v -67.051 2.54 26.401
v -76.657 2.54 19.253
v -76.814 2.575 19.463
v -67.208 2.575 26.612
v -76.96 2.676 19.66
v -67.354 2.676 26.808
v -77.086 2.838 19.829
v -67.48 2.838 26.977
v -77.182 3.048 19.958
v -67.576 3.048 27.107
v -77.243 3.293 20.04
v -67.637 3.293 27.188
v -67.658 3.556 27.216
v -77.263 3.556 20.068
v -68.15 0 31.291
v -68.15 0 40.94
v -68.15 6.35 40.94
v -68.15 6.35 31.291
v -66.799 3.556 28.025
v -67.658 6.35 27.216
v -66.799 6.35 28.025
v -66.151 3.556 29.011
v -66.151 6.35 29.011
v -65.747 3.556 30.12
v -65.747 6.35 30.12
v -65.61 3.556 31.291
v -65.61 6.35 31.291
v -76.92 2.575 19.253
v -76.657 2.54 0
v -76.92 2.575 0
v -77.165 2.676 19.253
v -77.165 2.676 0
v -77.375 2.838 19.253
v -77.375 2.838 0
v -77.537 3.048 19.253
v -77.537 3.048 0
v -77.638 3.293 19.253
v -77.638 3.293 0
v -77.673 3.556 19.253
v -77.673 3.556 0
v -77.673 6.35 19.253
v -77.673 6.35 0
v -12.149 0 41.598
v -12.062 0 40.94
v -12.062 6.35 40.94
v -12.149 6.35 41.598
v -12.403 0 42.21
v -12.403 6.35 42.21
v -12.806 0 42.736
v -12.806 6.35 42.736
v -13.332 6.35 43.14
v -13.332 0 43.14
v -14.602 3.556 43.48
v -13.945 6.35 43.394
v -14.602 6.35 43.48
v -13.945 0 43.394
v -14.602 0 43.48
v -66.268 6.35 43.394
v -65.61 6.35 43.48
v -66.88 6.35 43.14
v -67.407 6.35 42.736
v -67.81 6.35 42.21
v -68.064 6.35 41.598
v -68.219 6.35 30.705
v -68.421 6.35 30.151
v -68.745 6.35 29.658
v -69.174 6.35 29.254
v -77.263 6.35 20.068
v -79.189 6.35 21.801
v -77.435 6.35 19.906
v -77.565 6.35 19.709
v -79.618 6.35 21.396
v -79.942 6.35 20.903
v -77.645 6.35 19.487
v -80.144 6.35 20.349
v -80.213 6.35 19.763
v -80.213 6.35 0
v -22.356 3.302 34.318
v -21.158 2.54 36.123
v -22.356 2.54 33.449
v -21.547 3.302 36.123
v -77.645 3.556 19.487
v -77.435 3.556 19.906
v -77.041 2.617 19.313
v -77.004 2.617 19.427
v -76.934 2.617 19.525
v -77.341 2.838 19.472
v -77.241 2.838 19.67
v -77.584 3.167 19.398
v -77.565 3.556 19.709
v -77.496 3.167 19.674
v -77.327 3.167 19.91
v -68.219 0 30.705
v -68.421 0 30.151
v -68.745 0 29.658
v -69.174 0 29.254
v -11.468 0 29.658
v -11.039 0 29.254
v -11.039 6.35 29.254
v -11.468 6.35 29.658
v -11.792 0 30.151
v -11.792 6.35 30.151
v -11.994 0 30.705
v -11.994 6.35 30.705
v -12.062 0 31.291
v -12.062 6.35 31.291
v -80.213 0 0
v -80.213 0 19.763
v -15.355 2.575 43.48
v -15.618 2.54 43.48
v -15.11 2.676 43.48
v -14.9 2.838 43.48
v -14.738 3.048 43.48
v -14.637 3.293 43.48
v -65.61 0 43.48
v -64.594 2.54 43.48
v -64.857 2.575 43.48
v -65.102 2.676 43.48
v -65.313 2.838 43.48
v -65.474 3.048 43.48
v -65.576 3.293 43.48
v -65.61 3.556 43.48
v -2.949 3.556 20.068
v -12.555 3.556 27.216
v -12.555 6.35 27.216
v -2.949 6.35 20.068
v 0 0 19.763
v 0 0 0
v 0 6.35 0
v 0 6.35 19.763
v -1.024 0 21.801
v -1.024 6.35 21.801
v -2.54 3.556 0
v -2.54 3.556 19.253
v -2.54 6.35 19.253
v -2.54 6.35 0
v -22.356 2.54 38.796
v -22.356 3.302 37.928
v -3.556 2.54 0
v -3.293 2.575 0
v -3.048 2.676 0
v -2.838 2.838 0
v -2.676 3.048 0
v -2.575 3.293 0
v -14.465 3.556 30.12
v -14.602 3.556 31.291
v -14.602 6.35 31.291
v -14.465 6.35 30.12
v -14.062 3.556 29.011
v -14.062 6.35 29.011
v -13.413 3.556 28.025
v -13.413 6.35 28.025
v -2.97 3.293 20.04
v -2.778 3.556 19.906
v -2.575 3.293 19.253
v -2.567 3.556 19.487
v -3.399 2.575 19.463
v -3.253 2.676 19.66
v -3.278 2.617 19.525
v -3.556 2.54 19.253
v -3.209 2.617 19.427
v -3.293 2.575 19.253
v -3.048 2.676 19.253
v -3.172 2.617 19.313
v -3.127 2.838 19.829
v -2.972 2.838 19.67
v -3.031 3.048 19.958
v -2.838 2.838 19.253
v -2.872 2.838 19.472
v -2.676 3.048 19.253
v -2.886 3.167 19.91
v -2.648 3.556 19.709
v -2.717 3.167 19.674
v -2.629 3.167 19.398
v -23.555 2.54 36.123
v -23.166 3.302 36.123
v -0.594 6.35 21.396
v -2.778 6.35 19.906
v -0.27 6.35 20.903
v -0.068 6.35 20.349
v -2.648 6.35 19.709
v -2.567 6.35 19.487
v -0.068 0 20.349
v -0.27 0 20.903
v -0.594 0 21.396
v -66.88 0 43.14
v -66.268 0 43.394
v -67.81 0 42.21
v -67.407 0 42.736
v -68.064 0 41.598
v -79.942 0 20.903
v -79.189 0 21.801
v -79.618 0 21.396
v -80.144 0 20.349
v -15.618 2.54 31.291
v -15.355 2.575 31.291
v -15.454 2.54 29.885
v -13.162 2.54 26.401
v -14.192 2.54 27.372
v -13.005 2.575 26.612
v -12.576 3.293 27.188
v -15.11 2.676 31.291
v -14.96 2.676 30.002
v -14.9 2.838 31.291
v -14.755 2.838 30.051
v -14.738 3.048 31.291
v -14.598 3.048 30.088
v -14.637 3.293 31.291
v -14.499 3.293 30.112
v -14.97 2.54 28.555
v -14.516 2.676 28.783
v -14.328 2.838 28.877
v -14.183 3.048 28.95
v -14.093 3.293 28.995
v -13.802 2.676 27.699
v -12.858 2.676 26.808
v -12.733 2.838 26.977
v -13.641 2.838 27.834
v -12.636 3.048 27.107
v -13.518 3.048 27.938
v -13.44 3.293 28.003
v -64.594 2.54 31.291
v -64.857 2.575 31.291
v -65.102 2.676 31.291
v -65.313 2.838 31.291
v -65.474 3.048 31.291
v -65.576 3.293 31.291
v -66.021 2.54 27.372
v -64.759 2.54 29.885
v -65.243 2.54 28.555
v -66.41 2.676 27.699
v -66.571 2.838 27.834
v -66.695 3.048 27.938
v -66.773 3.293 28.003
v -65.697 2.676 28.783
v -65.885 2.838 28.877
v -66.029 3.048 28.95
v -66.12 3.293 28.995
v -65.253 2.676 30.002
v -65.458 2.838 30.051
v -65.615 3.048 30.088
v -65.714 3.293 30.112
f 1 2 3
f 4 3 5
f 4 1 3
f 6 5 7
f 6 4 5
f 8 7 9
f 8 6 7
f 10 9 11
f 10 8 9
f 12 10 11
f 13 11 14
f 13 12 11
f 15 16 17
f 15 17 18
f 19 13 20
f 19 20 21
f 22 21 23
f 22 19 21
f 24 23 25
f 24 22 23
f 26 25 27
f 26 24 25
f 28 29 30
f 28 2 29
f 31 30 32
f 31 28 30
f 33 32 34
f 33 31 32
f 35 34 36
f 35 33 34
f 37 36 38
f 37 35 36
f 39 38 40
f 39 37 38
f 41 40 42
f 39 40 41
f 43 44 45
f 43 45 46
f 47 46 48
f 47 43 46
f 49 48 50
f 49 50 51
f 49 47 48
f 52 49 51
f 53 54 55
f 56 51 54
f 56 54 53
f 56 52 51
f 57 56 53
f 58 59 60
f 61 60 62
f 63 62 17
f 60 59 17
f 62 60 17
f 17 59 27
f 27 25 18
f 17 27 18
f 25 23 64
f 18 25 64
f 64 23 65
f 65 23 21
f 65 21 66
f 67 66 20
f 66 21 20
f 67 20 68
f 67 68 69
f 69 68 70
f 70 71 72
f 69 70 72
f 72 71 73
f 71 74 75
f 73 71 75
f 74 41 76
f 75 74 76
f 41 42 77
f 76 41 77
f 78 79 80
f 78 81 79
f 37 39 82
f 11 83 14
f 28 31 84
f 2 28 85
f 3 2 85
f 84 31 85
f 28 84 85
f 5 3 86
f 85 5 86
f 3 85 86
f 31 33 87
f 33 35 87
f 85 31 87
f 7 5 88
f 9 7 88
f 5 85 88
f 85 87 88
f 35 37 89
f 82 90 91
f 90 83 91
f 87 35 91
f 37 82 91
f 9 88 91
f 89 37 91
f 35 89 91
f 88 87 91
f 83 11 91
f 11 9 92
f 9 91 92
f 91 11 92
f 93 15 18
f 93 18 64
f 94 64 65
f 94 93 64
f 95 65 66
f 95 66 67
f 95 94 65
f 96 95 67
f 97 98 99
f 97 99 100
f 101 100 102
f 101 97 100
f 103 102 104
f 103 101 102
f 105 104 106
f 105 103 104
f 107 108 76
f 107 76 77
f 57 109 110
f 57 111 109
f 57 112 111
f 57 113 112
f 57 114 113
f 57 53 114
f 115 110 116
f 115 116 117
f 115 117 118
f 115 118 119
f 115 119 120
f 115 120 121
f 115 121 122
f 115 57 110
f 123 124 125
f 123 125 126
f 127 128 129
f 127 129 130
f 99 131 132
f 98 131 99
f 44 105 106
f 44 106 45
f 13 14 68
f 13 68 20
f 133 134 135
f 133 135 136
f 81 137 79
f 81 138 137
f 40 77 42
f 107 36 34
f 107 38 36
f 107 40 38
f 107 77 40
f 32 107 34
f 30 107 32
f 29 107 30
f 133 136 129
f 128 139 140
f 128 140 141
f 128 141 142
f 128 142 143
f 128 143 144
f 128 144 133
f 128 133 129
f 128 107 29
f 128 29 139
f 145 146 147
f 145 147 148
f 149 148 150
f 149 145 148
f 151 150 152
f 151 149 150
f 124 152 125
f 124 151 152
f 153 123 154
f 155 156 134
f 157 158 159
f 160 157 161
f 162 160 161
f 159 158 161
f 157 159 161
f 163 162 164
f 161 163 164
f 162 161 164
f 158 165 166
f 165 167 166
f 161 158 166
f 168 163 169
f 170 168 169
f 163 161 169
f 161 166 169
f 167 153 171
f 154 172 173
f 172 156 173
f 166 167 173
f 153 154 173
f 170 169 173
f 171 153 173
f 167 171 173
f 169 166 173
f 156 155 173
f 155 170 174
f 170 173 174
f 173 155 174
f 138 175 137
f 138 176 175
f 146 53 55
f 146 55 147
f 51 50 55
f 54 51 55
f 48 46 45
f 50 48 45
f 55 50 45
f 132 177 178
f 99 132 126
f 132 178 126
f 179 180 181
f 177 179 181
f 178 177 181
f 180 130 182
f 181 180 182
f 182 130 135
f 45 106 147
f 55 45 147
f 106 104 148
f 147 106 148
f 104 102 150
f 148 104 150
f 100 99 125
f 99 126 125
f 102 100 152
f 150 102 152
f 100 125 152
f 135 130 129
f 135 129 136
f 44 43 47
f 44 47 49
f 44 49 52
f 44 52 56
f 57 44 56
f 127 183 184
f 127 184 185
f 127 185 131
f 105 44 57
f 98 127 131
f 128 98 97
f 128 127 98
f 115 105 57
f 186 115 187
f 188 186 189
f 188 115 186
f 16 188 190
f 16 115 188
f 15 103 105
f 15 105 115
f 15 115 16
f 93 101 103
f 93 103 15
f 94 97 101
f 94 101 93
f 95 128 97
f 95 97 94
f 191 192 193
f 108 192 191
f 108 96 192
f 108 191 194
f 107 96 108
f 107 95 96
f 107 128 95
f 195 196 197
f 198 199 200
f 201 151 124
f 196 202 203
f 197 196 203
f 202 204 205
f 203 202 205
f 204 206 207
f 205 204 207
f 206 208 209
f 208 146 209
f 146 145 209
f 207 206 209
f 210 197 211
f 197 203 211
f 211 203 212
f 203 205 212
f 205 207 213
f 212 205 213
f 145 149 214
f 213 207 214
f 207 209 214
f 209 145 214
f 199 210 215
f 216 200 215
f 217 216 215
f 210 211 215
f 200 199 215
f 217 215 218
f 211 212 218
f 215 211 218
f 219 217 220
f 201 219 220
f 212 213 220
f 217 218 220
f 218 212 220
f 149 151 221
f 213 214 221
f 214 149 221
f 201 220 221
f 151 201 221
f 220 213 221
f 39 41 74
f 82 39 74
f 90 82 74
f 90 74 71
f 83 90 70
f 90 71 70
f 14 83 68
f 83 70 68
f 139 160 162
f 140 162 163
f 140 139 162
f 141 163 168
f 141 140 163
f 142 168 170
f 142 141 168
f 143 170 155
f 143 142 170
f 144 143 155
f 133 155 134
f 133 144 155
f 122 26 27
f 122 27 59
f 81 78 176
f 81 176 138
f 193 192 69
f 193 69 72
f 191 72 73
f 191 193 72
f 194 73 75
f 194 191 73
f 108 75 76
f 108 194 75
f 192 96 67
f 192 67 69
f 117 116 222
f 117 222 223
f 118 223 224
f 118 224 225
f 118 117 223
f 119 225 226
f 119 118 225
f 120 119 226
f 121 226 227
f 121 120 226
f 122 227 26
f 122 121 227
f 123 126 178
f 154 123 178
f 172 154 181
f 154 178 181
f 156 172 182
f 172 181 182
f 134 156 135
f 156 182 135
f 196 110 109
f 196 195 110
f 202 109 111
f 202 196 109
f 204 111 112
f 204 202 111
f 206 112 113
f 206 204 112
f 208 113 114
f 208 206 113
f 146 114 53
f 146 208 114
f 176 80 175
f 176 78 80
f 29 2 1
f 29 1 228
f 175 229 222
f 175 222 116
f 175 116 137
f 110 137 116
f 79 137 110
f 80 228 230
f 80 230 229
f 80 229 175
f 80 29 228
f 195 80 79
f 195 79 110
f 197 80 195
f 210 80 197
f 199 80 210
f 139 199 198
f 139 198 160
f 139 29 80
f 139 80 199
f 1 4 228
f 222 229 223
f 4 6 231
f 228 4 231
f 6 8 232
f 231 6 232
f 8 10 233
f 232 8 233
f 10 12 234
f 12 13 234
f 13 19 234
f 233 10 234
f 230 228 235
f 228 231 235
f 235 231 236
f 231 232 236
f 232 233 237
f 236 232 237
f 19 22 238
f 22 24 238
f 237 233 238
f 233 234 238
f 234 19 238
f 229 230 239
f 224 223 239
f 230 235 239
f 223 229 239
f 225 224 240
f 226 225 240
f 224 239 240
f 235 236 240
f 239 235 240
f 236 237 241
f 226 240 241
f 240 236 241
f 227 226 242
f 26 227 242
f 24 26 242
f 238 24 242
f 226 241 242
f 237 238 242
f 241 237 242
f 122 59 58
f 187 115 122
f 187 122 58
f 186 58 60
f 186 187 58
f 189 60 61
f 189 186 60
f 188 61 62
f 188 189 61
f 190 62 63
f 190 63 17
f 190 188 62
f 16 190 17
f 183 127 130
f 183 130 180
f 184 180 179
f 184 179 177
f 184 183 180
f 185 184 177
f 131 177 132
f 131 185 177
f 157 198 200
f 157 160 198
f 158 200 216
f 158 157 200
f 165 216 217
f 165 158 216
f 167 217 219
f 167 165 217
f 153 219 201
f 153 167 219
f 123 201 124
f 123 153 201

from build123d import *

# Parameters (mm, degrees)
EXTRUDE1_DEPTH = 6.35
SHELL1_START   = 2.54
SHELL1_DEPTH   = 3.81
FILLET2_R      = 1.016
EXTRUDE2_DEPTH = 0.762
EXTRUDE2_TAPER = 25


# Read off the part's stored shape, not the designer's step: Shell1
with BuildPart() as part:
    # Sketch1 → Extrude1 (new body)
    with BuildSketch(Plane(origin=(0, 0, 0), x_dir=(1, 0, 0), z_dir=(0, 1, 0))):
        with BuildLine():
            Line((-14.602264877, -43.480257116), (-65.610482537, -43.480257116))
            ThreePointArc((-65.610482537, -43.480257116), (-67.406533761, -42.73630834), (-68.150482537, -40.940257116))
            Line((-68.150482537, -40.940257116), (-68.150482537, -31.291332317))
            ThreePointArc((-68.150482537, -31.291332317), (-68.420760673, -30.151173267), (-69.174075183, -29.253659935))
            Line((-69.174075183, -29.253659935), (-79.189154769, -21.800577453))
            ThreePointArc((-79.189154769, -21.800577453), (-79.942469279, -20.903064121), (-80.212747415, -19.762905071))
            Line((-80.212747415, -19.762905071), (-80.212747415, 0))
            Line((-80.212747415, 0), (0, 0))
            Line((0, 0), (0, -19.762905071))
            ThreePointArc((0, -19.762905071), (-0.270278136, -20.903064121), (-1.023592646, -21.800577453))
            Line((-1.023592646, -21.800577453), (-11.038672231, -29.253659935))
            ThreePointArc((-11.038672231, -29.253659935), (-11.791986741, -30.151173267), (-12.062264877, -31.291332317))
            Line((-12.062264877, -31.291332317), (-12.062264877, -40.940257116))
            ThreePointArc((-12.062264877, -40.940257116), (-12.806213653, -42.73630834), (-14.602264877, -43.480257116))
        make_face()
    extrude(amount=EXTRUDE1_DEPTH)

    # Shell1 outline → Shell1 (cut)
    with BuildSketch(Plane(origin=(0, 0, 0), x_dir=(1, 0, 0), z_dir=(0, 1, 0)).offset(SHELL1_START)):
        with BuildLine():
            Line((-14.602264877, -43.480257116), (-14.602264877, -31.291332317))
            ThreePointArc((-14.602264877, -31.291332317), (-14.061708605, -29.011014216), (-12.555079586, -27.215987553))
            Line((-12.555079586, -27.215987553), (-2.54, -19.762905071))
            Line((-2.54, -19.762905071), (-2.54, 0))
            Line((-2.54, 0), (-77.672747415, 0))
            Line((-77.672747415, 0), (-77.672747415, -19.762905071))
            Line((-77.672747415, -19.762905071), (-67.657667829, -27.215987553))
            ThreePointArc((-67.657667829, -27.215987553), (-66.151038809, -29.011014216), (-65.610482537, -31.291332317))
            Line((-65.610482537, -31.291332317), (-65.610482537, -43.480257116))
            Line((-65.610482537, -43.480257116), (-14.602264877, -43.480257116))
        make_face()
    extrude(amount=SHELL1_DEPTH, mode=Mode.SUBTRACT)

    # Fillet2
    fillet2_edges = [part.edges().sort_by_distance(p)[0] for p in [
        (-14.602264877, 2.54, 37.385794717),
        (-14.061708605, 2.54, 29.011014216),
        (-7.547539793, 2.54, 23.489446312),
        (-2.54, 2.54, 9.881452535),
        (-2.54, 4.445, 19.762905071),
        (-77.672747415, 2.54, 9.881452535),
        (-72.665207622, 2.54, 23.489446312),
        (-77.672747415, 4.445, 19.762905071),
        (-66.151038809, 2.54, 29.011014216),
        (-65.610482537, 2.54, 37.385794717),
    ]]
    fillet(fillet2_edges, radius=FILLET2_R)

    # Sketch3 → Extrude2 (add)
    with BuildSketch(Plane(origin=(0, 2.54, 0), x_dir=(-1, 0, 0), z_dir=(0, 1, 0))):
        Polygon((22.356461774, 33.449057502), (23.555013556, 36.122749938), (22.356461774, 38.796442374), (21.157909992, 36.122749938), align=None)
    extrude(amount=EXTRUDE2_DEPTH, taper=EXTRUDE2_TAPER)


solid = part.part
